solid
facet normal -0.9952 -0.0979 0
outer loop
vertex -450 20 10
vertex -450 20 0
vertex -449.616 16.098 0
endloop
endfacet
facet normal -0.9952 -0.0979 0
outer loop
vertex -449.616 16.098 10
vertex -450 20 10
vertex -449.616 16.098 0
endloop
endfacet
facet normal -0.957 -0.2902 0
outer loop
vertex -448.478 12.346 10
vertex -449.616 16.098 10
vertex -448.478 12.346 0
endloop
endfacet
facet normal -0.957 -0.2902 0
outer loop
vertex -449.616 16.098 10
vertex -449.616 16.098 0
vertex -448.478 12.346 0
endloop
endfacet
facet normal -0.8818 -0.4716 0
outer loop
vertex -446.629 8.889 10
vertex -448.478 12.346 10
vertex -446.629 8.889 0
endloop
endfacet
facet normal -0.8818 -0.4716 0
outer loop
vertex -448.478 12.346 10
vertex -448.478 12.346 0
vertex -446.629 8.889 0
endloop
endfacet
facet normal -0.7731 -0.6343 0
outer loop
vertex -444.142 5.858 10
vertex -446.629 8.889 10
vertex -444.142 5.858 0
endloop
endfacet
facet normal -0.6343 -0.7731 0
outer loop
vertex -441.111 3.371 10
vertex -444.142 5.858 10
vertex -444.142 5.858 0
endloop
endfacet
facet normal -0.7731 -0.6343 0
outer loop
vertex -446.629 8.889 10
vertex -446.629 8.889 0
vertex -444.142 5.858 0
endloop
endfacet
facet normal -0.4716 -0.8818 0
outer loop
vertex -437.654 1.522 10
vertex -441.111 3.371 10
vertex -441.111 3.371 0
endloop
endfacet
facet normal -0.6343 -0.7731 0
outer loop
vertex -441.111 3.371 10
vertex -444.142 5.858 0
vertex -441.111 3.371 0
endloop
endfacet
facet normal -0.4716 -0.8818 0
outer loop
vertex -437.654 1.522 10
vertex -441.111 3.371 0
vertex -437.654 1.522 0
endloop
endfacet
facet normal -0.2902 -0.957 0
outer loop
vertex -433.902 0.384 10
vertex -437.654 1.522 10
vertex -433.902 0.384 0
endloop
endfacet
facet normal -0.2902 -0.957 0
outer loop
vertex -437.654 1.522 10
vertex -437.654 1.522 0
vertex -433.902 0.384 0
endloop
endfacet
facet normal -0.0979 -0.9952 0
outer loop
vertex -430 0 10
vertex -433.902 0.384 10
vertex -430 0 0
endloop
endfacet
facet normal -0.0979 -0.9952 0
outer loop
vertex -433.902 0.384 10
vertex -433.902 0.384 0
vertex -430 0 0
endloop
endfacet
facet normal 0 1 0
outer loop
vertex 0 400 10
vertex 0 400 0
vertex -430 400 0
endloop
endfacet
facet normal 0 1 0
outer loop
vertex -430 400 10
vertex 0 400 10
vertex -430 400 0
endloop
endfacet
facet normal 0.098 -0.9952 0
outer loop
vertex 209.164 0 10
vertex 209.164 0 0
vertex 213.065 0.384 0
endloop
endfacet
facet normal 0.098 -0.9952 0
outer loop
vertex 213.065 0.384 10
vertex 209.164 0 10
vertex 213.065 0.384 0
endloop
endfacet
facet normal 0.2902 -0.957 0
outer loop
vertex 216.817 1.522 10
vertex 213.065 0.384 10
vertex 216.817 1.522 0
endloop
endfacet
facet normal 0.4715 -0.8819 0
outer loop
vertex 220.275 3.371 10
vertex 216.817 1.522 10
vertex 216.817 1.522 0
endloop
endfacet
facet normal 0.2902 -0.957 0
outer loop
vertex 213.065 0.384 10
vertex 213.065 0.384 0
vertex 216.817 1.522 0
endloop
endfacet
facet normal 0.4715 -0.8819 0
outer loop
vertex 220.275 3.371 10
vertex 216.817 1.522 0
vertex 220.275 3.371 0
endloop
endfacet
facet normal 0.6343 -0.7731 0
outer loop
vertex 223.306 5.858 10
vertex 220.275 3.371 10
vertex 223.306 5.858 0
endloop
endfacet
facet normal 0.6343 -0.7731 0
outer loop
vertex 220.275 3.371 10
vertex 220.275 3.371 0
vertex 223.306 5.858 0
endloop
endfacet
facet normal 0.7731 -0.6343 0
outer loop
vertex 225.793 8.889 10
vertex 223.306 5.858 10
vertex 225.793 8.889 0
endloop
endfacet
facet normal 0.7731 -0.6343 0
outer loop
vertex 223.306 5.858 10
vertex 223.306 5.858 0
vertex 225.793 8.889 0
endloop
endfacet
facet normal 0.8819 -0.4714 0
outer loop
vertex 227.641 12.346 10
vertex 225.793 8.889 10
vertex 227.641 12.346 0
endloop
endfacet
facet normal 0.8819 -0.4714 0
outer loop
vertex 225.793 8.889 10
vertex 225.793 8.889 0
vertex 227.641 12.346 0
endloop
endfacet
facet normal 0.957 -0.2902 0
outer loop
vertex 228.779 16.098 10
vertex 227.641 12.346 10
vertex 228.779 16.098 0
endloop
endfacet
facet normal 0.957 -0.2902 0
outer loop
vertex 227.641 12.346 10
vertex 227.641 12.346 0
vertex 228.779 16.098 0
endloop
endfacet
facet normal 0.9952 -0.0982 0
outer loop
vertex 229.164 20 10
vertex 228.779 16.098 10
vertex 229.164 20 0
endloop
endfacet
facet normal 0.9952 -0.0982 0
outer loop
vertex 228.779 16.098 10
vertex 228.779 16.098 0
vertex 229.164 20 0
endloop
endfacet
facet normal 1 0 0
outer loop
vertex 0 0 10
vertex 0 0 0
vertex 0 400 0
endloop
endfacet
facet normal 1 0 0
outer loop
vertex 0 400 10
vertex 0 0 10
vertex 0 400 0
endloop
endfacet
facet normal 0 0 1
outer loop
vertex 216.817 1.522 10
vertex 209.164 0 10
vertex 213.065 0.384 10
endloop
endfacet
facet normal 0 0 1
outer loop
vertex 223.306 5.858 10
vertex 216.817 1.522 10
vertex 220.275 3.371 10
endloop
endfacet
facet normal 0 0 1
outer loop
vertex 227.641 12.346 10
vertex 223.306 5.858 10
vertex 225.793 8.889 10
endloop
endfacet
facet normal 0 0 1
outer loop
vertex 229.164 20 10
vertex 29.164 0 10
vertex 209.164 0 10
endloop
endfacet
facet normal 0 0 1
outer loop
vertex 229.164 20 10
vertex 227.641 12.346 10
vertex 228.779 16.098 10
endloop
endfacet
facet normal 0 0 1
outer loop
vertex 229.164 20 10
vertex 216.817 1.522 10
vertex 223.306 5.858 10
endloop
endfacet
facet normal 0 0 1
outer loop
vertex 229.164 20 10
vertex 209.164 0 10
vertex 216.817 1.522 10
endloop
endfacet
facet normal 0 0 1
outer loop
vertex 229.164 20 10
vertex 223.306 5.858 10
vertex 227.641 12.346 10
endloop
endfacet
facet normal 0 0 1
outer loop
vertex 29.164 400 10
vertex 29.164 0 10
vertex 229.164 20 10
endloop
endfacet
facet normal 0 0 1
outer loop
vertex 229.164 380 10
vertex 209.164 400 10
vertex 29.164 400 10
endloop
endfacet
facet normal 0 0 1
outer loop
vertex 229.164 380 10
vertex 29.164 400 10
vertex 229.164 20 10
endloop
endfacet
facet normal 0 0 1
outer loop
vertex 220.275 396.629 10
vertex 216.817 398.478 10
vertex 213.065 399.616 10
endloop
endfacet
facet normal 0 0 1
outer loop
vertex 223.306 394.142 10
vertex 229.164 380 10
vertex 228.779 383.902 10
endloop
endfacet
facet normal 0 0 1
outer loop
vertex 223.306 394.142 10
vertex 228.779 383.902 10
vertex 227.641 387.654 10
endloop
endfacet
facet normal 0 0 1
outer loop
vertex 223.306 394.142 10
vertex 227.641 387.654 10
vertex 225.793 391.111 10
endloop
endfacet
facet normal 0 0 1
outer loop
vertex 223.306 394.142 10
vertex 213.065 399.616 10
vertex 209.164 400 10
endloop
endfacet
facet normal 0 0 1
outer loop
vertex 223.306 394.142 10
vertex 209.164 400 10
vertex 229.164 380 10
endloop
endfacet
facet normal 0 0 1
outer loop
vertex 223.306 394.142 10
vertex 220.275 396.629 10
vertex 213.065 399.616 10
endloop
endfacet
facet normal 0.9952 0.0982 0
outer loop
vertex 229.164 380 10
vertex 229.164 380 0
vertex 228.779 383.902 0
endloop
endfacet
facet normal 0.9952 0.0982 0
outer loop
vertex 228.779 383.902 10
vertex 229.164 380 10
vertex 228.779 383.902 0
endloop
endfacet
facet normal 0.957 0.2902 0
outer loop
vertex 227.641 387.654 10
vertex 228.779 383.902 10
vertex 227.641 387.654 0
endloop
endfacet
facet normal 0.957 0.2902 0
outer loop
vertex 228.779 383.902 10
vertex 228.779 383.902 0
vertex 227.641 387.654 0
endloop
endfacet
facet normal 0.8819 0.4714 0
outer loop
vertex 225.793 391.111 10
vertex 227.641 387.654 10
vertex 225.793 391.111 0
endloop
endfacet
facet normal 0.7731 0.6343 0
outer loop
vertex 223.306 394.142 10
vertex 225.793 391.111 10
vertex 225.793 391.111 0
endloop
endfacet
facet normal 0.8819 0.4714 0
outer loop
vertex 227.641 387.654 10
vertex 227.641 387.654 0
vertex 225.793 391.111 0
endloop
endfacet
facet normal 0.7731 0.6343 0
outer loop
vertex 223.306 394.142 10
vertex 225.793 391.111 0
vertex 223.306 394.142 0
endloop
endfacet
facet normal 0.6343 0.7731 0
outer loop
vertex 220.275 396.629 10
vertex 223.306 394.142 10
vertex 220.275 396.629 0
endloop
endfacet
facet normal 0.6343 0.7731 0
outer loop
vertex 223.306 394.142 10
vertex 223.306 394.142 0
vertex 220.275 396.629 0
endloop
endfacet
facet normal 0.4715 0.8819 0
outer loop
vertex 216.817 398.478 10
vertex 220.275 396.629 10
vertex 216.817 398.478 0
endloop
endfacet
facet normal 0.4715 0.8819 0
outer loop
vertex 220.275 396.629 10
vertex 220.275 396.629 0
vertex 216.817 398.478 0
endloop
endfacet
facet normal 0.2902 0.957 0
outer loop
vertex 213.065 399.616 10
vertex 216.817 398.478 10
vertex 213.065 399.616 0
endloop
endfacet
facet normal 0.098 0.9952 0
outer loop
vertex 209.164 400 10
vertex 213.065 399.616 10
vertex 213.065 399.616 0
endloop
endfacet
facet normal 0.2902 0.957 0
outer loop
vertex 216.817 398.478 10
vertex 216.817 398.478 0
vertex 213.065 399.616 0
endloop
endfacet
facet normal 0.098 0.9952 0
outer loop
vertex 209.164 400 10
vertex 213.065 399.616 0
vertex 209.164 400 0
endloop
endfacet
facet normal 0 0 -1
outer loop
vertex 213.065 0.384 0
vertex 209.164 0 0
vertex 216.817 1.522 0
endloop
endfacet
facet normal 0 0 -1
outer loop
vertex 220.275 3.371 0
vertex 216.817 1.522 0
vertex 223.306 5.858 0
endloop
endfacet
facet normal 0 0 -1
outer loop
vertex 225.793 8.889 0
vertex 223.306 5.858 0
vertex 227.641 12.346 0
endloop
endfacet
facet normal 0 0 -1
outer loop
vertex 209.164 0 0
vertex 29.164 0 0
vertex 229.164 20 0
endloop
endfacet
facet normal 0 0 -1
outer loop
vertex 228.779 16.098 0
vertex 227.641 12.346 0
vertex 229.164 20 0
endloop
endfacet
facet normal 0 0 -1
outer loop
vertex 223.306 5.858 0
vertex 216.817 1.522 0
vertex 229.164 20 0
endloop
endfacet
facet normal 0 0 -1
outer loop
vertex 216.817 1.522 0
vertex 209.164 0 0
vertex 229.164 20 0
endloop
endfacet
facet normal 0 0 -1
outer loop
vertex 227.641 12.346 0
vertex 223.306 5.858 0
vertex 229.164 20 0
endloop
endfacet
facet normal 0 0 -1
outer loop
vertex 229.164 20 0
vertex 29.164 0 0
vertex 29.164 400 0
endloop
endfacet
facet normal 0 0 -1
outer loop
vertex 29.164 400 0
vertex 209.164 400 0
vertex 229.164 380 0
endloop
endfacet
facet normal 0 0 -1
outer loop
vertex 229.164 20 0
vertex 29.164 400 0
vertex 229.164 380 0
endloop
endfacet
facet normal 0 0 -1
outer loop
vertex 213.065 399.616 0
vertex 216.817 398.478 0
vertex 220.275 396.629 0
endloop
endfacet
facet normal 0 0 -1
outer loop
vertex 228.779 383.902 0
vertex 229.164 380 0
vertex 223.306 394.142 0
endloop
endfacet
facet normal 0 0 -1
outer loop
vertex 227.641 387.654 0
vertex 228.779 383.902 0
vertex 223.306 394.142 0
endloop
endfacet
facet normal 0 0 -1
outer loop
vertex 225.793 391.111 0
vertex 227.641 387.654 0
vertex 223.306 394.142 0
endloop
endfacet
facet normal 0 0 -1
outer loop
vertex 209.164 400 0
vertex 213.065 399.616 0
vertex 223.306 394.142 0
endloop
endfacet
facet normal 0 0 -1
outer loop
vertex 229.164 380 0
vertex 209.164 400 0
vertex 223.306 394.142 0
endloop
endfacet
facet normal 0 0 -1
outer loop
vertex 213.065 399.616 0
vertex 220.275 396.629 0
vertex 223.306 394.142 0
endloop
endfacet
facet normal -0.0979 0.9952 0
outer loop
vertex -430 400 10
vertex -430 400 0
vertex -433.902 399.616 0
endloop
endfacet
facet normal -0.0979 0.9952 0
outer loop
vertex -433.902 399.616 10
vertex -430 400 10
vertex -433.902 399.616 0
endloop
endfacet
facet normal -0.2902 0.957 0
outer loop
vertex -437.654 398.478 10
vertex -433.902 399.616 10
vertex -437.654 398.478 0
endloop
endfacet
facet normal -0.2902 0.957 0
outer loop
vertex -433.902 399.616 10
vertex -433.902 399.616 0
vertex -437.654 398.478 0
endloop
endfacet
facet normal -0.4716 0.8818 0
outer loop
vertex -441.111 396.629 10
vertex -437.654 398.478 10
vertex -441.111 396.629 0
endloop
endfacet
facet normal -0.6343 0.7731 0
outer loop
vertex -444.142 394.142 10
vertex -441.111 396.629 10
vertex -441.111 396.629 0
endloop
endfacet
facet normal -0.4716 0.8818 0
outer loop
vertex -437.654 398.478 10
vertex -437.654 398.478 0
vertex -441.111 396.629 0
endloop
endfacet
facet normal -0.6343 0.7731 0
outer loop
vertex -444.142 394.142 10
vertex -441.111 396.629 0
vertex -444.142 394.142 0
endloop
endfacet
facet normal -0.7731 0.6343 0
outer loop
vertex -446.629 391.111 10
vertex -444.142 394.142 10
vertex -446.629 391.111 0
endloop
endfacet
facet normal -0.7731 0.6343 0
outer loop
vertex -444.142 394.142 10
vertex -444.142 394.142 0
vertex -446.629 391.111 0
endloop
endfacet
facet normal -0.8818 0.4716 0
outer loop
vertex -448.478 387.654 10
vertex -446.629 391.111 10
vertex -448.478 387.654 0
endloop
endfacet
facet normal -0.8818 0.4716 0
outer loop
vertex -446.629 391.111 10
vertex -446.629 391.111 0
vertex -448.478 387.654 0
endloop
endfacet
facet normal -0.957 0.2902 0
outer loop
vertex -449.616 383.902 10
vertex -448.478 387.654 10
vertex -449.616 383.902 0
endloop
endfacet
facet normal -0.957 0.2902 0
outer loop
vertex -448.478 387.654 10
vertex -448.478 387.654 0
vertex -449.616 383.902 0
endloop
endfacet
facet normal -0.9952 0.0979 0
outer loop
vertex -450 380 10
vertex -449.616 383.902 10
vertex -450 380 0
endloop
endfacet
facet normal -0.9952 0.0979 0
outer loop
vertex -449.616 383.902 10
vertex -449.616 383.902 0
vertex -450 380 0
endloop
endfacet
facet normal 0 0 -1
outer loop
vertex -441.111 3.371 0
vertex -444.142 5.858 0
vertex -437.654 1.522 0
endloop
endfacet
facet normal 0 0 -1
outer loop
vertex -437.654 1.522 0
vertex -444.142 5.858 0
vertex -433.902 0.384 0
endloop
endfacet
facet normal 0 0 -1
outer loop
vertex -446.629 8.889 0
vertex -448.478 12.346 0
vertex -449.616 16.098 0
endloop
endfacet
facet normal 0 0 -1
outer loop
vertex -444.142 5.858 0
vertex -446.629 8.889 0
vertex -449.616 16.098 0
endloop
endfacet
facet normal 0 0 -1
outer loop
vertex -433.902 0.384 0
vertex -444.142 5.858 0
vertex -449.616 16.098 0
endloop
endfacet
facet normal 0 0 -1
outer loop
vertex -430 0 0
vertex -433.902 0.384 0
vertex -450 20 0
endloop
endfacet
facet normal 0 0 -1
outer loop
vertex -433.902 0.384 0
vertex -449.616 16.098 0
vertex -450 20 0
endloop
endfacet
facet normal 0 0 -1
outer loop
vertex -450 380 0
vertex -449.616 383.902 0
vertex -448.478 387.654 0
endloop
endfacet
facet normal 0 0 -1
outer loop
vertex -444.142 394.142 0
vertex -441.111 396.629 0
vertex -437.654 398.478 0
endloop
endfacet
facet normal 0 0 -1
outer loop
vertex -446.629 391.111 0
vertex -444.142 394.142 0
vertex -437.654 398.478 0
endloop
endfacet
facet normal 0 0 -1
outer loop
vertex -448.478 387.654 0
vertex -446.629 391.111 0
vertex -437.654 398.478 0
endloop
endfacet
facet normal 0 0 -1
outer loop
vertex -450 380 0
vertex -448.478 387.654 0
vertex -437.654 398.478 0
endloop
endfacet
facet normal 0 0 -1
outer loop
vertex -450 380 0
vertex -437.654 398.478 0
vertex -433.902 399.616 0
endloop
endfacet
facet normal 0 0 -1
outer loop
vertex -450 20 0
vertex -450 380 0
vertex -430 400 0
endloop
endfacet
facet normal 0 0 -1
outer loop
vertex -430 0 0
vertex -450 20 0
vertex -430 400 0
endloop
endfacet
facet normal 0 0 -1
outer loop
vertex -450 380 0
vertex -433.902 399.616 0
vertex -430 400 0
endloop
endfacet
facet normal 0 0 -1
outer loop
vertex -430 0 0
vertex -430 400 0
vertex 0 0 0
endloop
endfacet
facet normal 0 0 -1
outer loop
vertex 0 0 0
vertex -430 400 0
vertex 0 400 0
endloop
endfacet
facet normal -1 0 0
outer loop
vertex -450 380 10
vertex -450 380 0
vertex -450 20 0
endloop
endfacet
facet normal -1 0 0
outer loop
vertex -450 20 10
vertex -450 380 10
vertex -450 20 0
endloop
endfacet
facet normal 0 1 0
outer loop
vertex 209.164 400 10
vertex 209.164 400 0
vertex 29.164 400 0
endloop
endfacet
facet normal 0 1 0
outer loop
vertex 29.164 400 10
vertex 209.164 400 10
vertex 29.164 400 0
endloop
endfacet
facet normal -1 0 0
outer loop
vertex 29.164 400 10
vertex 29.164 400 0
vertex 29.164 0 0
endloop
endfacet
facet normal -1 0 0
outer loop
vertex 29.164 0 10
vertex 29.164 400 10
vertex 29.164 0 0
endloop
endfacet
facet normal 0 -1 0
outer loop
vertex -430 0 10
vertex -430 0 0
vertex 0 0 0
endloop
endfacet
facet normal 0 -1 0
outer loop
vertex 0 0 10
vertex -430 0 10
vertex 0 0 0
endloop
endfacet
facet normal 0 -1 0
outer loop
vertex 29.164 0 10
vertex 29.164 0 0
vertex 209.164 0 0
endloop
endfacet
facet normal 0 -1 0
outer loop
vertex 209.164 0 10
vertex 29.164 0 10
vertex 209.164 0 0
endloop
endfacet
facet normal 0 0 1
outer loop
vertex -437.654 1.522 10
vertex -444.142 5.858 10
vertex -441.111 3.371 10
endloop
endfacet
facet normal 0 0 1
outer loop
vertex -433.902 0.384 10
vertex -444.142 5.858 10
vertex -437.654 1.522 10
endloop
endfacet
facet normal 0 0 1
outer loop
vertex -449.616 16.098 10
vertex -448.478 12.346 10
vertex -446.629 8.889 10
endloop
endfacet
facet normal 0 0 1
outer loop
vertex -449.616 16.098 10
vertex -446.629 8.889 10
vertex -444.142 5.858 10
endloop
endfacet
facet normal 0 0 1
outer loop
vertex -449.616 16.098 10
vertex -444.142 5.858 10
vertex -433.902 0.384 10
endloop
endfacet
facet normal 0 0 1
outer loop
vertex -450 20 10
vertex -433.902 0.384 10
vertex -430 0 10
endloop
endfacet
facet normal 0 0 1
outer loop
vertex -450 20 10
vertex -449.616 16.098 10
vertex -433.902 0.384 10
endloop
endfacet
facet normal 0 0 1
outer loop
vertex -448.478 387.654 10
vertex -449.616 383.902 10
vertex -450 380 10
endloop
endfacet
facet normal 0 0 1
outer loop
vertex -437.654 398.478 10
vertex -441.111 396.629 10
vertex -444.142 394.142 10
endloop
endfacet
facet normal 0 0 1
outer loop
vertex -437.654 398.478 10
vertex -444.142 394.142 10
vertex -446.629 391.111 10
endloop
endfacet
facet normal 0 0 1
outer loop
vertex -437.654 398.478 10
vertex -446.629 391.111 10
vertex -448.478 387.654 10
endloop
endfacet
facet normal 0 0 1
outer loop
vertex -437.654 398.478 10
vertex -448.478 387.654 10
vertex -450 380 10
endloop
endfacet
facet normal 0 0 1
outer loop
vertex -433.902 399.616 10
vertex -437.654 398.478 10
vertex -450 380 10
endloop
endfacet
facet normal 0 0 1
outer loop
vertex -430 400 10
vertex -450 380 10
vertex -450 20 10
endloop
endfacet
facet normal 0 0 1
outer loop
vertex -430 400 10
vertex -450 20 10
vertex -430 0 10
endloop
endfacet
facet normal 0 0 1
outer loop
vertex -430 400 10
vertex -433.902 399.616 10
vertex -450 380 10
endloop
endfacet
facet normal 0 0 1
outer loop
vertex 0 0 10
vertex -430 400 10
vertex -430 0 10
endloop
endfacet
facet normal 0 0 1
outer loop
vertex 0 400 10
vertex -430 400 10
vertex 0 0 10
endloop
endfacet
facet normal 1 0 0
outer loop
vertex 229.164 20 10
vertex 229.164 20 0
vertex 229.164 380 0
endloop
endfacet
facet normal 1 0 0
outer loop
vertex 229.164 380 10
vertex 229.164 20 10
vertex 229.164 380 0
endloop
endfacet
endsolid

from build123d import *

# Parameters (mm, degrees)
F1_DEPTH = 10
F3_DEPTH = 10


with BuildPart() as f1:
    # F0 (on Top) → F1 (new body)
    with BuildSketch(Plane.XY):
        with BuildLine():
            Line((-430, 0), (0, 0))
            Line((0, 0), (0, 400))
            Line((0, 400), (-430, 400))
            ThreePointArc((-430, 400), (-444.142136, 394.142136), (-450, 380))
            Line((-450, 380), (-450, 20))
            ThreePointArc((-450, 20), (-444.142136, 5.857864), (-430, 0))
        make_face()
    extrude(amount=F1_DEPTH)


with BuildPart() as f3:
    # F2 (on Top) → F3 (new body)
    with BuildSketch(Plane.XY):
        with BuildLine():
            Line((29.163611, 400), (29.163611, 0))
            Line((29.163611, 0), (209.163611, 0))
            ThreePointArc((209.163611, 0), (223.305746, 5.857864), (229.163611, 20))
            Line((229.163611, 20), (229.163611, 380))
            ThreePointArc((229.163611, 380), (223.305746, 394.142136), (209.163611, 400))
            Line((209.163611, 400), (29.163611, 400))
        make_face()
    extrude(amount=F3_DEPTH)


solid = Compound([f1.part, f3.part])
